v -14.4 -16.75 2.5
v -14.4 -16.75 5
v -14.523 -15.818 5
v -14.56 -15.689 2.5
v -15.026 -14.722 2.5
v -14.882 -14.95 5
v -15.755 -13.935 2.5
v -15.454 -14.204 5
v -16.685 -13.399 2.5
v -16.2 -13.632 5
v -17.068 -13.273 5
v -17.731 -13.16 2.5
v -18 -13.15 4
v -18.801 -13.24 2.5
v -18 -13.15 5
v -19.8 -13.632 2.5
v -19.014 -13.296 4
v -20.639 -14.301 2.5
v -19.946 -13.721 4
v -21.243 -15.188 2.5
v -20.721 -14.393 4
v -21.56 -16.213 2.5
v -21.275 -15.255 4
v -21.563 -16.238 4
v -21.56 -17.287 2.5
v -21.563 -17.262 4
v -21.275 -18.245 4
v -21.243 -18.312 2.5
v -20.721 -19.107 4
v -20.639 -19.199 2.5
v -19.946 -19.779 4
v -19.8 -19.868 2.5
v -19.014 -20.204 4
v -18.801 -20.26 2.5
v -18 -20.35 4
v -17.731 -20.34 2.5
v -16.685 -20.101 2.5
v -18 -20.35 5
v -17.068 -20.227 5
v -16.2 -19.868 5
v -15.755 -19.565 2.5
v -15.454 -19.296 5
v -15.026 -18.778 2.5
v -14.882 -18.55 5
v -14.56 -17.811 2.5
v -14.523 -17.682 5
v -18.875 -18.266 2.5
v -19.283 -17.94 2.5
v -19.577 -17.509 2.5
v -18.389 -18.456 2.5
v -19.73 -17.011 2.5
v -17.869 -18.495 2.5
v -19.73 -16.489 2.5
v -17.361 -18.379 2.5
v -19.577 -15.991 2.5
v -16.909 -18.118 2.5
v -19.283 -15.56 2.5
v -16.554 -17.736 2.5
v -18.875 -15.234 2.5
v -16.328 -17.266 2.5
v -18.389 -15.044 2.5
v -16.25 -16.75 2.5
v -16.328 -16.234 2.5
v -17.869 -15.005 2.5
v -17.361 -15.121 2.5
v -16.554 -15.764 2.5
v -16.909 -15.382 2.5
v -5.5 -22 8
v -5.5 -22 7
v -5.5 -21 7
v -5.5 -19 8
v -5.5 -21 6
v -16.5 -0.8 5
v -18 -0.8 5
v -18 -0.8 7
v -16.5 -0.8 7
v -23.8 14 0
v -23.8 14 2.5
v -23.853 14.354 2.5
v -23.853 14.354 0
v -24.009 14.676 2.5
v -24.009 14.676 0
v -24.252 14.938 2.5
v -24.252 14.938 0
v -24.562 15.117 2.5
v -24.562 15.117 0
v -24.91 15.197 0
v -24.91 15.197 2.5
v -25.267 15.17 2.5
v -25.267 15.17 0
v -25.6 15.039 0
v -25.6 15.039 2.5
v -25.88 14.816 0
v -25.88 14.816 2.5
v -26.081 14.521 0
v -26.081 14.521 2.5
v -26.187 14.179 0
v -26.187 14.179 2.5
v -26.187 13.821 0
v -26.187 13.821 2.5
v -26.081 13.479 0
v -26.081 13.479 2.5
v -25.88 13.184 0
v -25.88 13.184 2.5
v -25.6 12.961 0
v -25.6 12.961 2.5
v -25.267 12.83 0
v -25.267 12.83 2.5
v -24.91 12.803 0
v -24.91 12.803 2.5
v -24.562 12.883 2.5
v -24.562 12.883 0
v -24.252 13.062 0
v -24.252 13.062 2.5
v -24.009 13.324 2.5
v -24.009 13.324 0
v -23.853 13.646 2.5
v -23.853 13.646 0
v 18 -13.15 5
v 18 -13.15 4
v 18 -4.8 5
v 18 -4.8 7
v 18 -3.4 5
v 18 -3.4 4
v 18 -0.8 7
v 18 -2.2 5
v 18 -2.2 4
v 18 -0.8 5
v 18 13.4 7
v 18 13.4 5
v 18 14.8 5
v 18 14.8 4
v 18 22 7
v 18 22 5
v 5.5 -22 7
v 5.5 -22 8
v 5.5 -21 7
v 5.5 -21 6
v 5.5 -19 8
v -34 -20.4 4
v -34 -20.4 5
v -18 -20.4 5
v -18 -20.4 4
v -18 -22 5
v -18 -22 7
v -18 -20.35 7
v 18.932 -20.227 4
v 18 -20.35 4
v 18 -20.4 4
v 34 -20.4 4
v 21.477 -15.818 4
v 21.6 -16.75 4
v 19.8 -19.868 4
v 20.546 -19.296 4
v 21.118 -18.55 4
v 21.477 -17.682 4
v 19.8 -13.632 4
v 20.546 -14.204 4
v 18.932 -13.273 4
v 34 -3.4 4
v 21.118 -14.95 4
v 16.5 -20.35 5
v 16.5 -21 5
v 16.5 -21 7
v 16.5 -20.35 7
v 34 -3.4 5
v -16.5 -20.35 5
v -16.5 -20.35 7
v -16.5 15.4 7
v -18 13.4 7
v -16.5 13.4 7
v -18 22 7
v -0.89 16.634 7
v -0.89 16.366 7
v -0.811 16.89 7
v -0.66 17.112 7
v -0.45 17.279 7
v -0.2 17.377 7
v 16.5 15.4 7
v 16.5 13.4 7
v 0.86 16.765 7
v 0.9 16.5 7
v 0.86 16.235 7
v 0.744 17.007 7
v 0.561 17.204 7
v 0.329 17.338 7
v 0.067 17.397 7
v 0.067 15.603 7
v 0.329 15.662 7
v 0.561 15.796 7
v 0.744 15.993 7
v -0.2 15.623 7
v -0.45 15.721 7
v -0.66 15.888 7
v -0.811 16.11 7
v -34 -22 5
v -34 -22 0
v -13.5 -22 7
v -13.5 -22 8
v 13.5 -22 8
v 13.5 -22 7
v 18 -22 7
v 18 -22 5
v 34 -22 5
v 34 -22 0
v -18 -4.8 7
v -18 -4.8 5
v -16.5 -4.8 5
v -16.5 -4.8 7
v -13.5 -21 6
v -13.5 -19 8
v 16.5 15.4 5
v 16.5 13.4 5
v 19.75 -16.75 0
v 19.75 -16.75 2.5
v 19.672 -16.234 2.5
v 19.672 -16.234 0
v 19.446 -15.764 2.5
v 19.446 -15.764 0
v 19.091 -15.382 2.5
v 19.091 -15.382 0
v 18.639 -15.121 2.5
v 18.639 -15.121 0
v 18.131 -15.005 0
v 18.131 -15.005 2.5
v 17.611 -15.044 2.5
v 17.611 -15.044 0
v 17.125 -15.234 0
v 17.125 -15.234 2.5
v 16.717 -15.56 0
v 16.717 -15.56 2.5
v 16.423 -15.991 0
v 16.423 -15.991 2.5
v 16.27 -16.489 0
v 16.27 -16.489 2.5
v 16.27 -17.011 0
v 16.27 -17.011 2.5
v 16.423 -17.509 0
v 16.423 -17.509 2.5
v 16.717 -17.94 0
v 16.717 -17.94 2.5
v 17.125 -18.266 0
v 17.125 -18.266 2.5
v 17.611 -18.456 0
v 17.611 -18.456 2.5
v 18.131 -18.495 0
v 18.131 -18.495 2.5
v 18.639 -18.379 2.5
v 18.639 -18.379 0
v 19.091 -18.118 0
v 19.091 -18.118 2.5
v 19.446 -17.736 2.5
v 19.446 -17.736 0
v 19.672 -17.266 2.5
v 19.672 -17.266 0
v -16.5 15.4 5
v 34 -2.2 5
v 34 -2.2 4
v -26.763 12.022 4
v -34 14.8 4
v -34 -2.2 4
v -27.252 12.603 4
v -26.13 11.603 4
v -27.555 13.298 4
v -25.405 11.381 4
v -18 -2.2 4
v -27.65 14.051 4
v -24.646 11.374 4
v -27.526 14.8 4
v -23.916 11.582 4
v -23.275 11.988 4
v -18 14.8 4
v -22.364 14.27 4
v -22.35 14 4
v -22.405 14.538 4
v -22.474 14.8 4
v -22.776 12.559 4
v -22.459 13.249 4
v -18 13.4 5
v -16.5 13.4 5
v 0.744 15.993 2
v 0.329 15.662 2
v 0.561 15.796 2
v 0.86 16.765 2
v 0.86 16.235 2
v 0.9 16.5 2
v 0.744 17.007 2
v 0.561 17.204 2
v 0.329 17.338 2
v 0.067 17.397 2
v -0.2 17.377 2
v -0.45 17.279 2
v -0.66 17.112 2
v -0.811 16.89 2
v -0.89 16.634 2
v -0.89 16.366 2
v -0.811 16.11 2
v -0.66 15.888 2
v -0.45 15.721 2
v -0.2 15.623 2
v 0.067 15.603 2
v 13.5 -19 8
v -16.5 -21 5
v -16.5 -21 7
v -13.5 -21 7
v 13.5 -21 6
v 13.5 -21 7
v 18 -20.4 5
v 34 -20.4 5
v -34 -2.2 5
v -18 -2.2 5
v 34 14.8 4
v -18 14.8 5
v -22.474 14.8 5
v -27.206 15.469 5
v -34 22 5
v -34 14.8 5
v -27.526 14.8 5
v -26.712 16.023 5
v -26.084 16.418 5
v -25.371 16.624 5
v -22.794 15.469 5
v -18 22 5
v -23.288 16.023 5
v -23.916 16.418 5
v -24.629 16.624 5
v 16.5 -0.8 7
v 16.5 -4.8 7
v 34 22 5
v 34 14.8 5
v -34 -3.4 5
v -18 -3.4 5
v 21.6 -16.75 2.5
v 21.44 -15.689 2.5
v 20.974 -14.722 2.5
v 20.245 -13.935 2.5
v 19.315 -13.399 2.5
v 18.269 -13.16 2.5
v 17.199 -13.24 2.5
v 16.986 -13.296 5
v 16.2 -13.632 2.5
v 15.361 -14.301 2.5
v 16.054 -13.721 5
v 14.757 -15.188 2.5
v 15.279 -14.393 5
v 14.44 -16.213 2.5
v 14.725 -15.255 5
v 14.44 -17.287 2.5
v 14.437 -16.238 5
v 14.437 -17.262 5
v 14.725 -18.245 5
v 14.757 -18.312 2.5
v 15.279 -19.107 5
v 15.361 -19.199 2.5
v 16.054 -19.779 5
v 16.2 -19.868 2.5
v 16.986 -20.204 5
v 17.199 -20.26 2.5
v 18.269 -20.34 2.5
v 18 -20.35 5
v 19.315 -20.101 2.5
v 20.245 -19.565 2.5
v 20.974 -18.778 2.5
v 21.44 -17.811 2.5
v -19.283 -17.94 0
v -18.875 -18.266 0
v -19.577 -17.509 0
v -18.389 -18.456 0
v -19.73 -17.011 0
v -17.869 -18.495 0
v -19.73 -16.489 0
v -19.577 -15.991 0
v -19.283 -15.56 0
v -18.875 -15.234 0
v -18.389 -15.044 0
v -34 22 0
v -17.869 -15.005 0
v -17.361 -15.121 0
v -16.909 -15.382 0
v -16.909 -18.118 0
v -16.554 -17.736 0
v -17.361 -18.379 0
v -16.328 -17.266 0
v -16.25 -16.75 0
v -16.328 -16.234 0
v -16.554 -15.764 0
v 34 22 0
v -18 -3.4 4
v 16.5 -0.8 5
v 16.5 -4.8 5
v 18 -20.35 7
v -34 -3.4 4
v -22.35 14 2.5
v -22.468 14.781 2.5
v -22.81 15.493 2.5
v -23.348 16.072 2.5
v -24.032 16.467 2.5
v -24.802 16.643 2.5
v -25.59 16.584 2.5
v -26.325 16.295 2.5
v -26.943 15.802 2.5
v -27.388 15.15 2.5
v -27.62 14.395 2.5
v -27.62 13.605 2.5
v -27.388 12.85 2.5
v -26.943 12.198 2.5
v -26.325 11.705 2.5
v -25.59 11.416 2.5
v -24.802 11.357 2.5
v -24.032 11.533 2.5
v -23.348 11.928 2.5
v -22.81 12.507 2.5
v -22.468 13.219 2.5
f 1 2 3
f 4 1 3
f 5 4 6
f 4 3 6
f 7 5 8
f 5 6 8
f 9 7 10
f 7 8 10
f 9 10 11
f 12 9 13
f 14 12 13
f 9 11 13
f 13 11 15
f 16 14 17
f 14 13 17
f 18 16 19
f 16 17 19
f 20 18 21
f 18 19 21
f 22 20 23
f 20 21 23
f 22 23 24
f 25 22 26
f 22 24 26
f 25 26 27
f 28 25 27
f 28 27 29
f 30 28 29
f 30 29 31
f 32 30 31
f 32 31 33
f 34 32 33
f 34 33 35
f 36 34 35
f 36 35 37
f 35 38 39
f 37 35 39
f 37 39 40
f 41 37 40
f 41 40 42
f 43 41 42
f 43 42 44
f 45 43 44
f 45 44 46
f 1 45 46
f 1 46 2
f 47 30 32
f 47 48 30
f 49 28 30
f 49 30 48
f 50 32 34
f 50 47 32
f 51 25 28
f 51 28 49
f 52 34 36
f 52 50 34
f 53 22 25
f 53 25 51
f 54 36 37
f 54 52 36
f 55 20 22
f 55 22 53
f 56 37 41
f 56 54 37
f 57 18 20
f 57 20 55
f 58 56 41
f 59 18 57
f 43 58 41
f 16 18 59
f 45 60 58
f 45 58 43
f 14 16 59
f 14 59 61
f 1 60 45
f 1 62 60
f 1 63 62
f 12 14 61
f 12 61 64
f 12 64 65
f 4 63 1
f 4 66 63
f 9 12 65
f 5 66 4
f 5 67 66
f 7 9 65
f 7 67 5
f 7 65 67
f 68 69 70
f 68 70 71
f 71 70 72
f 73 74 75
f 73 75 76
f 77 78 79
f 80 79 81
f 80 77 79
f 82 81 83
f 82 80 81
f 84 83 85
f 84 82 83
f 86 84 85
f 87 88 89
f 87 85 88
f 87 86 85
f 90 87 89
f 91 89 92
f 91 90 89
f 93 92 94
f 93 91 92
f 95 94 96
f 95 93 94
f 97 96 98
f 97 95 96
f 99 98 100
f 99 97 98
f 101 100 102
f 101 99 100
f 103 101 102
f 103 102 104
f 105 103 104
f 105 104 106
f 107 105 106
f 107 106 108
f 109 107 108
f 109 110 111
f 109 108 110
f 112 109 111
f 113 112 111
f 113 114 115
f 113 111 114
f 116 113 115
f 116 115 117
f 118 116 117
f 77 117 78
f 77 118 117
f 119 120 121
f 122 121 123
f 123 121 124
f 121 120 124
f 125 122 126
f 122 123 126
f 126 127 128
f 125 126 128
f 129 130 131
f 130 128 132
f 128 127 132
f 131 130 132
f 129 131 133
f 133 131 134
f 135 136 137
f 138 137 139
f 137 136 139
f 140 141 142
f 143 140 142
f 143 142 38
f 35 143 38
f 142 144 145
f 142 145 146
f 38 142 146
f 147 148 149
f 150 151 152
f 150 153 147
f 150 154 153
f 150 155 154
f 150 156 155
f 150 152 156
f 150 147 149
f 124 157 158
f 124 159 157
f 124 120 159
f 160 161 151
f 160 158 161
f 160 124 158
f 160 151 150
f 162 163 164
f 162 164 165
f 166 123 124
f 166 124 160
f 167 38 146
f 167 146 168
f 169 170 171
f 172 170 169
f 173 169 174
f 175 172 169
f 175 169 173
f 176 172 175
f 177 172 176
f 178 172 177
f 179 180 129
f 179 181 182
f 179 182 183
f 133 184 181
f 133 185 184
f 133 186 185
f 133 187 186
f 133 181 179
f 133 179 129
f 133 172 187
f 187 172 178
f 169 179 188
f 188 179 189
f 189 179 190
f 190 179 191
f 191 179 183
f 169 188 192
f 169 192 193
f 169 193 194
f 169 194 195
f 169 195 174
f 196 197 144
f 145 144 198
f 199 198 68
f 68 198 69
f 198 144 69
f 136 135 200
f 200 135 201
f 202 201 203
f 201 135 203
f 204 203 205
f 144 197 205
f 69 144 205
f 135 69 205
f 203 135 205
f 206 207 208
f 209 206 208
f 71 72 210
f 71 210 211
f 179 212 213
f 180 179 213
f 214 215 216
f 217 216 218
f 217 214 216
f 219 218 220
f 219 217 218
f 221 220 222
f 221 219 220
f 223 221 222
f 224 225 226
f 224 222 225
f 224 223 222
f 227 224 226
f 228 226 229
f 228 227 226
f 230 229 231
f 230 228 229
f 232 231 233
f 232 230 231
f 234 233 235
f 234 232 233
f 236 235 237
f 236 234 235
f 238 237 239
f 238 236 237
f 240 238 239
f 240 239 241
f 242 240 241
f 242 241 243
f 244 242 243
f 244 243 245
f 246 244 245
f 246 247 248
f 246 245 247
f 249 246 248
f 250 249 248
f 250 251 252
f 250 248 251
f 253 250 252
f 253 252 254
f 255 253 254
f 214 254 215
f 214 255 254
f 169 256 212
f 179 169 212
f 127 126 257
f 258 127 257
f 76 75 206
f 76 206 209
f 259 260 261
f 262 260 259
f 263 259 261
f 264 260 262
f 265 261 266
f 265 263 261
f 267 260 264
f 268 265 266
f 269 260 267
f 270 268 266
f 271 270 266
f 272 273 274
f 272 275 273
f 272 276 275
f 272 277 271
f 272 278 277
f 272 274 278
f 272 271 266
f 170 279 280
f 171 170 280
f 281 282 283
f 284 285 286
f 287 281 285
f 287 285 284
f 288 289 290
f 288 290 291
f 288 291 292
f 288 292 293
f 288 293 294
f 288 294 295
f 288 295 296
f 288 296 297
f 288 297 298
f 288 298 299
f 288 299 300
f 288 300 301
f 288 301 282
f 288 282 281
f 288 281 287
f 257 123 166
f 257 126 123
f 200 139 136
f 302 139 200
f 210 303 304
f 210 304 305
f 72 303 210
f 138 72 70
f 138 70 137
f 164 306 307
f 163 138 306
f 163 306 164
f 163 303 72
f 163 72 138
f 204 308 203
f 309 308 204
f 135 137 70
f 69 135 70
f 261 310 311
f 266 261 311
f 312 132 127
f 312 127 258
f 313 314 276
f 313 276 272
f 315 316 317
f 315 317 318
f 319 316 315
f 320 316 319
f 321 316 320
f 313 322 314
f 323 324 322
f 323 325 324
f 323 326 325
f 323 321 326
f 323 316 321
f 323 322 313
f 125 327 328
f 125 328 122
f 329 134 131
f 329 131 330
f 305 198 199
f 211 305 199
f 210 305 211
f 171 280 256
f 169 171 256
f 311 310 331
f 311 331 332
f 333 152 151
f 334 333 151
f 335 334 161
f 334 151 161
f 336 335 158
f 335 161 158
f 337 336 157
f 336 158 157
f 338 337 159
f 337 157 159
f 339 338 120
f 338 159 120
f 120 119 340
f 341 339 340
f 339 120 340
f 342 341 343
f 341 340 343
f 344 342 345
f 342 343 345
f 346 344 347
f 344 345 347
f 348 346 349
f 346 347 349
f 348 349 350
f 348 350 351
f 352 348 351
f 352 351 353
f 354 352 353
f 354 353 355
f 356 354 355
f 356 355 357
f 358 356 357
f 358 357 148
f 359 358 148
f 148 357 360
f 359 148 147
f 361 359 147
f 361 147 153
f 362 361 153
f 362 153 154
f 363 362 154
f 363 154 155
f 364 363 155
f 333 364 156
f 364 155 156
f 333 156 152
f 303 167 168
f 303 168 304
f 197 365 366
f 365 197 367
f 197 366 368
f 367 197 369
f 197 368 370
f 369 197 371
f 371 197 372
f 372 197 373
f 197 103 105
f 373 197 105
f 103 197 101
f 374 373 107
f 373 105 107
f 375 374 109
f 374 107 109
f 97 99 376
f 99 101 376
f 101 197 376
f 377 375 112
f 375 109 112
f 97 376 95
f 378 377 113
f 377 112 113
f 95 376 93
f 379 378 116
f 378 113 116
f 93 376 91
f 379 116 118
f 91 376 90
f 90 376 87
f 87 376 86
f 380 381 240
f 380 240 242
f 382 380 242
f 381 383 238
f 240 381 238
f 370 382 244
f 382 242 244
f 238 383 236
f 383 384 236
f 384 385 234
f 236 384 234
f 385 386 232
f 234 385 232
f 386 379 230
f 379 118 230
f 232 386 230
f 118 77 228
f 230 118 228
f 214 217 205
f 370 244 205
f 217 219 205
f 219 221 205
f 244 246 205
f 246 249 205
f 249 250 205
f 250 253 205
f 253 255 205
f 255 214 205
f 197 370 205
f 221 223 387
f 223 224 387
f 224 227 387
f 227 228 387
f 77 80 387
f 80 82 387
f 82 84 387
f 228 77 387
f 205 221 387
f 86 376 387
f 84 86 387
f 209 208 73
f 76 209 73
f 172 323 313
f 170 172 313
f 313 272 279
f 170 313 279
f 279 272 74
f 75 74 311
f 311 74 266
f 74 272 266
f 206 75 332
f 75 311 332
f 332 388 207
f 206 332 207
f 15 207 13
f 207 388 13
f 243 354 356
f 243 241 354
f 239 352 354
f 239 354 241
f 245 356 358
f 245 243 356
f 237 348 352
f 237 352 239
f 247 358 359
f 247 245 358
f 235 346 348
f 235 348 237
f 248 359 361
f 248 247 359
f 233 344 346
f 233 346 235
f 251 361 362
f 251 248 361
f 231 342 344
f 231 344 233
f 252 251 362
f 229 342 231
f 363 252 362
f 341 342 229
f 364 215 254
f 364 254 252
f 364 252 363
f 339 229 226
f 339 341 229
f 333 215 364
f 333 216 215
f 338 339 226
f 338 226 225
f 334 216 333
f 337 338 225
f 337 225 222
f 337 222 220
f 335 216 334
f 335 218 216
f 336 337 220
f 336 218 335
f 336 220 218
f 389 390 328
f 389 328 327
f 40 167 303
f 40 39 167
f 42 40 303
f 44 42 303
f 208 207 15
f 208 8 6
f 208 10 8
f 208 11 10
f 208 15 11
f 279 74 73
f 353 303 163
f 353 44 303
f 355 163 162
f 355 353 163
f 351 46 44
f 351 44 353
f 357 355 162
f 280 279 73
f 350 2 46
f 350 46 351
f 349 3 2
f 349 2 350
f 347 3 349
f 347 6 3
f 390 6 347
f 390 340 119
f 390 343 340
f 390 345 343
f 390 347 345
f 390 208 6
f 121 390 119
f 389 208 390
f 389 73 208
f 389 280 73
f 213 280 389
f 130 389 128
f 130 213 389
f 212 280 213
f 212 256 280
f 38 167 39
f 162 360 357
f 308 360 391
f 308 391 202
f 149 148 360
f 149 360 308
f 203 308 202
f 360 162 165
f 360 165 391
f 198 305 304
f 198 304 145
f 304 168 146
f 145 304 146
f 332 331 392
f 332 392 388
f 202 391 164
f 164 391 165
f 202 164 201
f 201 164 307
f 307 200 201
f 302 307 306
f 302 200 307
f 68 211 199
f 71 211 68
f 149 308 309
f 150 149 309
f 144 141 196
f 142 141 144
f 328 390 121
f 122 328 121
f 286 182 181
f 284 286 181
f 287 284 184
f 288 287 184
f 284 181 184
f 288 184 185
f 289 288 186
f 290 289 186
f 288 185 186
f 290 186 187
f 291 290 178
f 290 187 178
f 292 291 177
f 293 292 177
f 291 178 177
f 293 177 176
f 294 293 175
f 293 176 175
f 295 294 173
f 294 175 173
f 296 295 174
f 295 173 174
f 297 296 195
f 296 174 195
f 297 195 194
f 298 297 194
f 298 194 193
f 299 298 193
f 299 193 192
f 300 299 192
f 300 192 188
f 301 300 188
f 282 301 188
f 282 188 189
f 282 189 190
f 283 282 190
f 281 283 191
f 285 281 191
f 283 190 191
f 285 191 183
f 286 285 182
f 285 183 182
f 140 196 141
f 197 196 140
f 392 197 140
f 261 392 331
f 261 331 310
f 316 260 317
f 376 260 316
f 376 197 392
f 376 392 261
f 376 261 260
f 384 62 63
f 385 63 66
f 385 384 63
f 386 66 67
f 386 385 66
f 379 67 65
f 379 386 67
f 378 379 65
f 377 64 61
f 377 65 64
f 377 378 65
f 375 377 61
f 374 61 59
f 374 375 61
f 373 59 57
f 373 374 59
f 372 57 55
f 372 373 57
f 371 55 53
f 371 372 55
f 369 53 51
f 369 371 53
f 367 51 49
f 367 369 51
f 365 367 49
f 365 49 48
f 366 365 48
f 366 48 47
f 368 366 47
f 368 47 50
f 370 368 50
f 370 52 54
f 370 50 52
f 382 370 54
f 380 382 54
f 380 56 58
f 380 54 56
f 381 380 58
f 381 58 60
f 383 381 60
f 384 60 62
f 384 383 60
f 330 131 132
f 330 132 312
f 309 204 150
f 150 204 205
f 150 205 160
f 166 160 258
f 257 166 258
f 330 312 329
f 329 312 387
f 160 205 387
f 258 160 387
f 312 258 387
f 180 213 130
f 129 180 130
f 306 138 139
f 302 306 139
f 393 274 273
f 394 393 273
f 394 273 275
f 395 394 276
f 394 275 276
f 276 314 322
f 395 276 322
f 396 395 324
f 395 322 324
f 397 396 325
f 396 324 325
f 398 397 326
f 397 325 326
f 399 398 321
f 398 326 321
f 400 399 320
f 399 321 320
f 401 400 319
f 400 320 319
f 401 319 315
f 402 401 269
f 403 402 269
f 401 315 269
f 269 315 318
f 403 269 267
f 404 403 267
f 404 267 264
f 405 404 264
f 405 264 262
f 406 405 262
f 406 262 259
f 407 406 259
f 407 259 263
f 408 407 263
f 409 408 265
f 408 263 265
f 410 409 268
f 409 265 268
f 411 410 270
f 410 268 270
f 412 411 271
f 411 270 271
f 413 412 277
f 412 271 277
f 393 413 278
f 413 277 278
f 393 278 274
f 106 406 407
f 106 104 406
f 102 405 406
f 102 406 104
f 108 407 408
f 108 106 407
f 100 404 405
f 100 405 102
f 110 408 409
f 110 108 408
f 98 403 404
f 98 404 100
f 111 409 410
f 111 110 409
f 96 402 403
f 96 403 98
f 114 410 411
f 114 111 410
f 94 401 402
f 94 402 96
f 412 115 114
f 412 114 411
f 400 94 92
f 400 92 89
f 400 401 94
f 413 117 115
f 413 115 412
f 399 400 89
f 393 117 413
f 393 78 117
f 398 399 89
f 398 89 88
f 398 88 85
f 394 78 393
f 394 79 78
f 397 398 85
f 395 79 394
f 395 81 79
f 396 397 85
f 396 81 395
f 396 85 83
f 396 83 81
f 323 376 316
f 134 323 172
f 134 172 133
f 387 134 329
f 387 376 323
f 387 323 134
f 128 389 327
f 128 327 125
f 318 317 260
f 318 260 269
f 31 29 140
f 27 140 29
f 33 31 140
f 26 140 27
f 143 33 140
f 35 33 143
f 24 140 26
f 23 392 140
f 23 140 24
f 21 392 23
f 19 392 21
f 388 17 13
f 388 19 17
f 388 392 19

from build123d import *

# Parameters (mm, degrees)
SKETCH_W        = 68
SKETCH_H        = 44
SKETCH_R        = 1.75
SKETCH_R_2      = 1.2
PAD_DEPTH       = 5
SKETCH001_R     = 3.6
SKETCH001_R_2   = 2.65
POCKET_DEPTH    = 2.5
SKETCH002_W     = 1.5
SKETCH002_H     = 4
PAD001_DEPTH    = 2
SKETCH003_R     = 0.9
POCKET001_DEPTH = 5
SKETCH004_W     = 16
SKETCH004_H     = 17
POCKET002_DEPTH = 1
SKETCH005_W     = 8
SKETCH005_H     = 3
PAD002_DEPTH    = 1
POCKET003_DEPTH = 27


with BuildPart() as part:
    # Sketch → Pad (new body)
    with BuildSketch(Plane.XY):
        Rectangle(SKETCH_W, SKETCH_H)
        with Locations((18, -16.75)):
            Circle(SKETCH_R, mode=Mode.SUBTRACT)
        with Locations((-18, -16.75)):
            Circle(SKETCH_R, mode=Mode.SUBTRACT)
        with Locations((-25, 14)):
            Circle(SKETCH_R_2, mode=Mode.SUBTRACT)
    extrude(amount=PAD_DEPTH)

    # Sketch001 (on Face9 of Pad) → Pocket (cut)
    with BuildSketch(Plane.XY.offset(5)):
        with Locations((-18, -16.75)):
            Circle(SKETCH001_R)
        with Locations((18, -16.75)):
            Circle(SKETCH001_R)
        with Locations((-25, 14)):
            Circle(SKETCH001_R_2)
    extrude(amount=-POCKET_DEPTH, mode=Mode.SUBTRACT)

    # Sketch002 (on Face5 of Pocket) → Pad001 (join)
    with BuildSketch(Plane.XY.offset(5)):
        Polygon((-16.5, -21), (16.5, -21), (16.5, -20.35), (18, -20.35), (18, -22), (-18, -22), (-18, -20.35), (-16.5, -20.35), align=None)
        Polygon((16.5, 15.4), (16.5, 13.4), (18, 13.4), (18, 22), (-18, 22), (-18, 13.4), (-16.5, 13.4), (-16.5, 15.4), align=None)
        with Locations((-17.25, -2.8)):
            Rectangle(SKETCH002_W, SKETCH002_H)
        with Locations((17.25, -2.8)):
            Rectangle(SKETCH002_W, SKETCH002_H)
    extrude(amount=PAD001_DEPTH)

    # Sketch003 (on Face34 of Pad001) → Pocket001 (cut)
    with BuildSketch(Plane.XY.offset(7)):
        with Locations((0, 16.5)):
            Circle(SKETCH003_R)
    extrude(amount=-POCKET001_DEPTH, mode=Mode.SUBTRACT)

    # Sketch004 (on Face5 of Pocket001) → Pocket002 (cut)
    with BuildSketch(Plane.XY.offset(5)):
        with Locations((26, 6.3)):
            Rectangle(SKETCH004_W, SKETCH004_H)
        with Locations((26, -11.9)):
            Rectangle(SKETCH004_W, SKETCH004_H)
        with Locations((-26, 6.3)):
            Rectangle(SKETCH004_W, SKETCH004_H)
        with Locations((-26, -11.9)):
            Rectangle(SKETCH004_W, SKETCH004_H)
    extrude(amount=-POCKET002_DEPTH, mode=Mode.SUBTRACT)

    # Sketch005 (on Face21 of Pocket002) → Pad002 (join, symmetric)
    with BuildSketch(Plane.XY.offset(7)):
        with Locations((-9.5, -20.5)):
            Rectangle(SKETCH005_W, SKETCH005_H)
        with Locations((9.5, -20.5)):
            Rectangle(SKETCH005_W, SKETCH005_H)
    extrude(amount=PAD002_DEPTH, both=True)

    # Sketch006 (on Face62 of Pad002) → Pocket003 (cut)
    with BuildSketch(Plane.YZ.offset(13.5)):
        Polygon((-19, 6), (-21, 6), (-19, 8), align=None)
    extrude(amount=-POCKET003_DEPTH, mode=Mode.SUBTRACT)


solid = part.part
